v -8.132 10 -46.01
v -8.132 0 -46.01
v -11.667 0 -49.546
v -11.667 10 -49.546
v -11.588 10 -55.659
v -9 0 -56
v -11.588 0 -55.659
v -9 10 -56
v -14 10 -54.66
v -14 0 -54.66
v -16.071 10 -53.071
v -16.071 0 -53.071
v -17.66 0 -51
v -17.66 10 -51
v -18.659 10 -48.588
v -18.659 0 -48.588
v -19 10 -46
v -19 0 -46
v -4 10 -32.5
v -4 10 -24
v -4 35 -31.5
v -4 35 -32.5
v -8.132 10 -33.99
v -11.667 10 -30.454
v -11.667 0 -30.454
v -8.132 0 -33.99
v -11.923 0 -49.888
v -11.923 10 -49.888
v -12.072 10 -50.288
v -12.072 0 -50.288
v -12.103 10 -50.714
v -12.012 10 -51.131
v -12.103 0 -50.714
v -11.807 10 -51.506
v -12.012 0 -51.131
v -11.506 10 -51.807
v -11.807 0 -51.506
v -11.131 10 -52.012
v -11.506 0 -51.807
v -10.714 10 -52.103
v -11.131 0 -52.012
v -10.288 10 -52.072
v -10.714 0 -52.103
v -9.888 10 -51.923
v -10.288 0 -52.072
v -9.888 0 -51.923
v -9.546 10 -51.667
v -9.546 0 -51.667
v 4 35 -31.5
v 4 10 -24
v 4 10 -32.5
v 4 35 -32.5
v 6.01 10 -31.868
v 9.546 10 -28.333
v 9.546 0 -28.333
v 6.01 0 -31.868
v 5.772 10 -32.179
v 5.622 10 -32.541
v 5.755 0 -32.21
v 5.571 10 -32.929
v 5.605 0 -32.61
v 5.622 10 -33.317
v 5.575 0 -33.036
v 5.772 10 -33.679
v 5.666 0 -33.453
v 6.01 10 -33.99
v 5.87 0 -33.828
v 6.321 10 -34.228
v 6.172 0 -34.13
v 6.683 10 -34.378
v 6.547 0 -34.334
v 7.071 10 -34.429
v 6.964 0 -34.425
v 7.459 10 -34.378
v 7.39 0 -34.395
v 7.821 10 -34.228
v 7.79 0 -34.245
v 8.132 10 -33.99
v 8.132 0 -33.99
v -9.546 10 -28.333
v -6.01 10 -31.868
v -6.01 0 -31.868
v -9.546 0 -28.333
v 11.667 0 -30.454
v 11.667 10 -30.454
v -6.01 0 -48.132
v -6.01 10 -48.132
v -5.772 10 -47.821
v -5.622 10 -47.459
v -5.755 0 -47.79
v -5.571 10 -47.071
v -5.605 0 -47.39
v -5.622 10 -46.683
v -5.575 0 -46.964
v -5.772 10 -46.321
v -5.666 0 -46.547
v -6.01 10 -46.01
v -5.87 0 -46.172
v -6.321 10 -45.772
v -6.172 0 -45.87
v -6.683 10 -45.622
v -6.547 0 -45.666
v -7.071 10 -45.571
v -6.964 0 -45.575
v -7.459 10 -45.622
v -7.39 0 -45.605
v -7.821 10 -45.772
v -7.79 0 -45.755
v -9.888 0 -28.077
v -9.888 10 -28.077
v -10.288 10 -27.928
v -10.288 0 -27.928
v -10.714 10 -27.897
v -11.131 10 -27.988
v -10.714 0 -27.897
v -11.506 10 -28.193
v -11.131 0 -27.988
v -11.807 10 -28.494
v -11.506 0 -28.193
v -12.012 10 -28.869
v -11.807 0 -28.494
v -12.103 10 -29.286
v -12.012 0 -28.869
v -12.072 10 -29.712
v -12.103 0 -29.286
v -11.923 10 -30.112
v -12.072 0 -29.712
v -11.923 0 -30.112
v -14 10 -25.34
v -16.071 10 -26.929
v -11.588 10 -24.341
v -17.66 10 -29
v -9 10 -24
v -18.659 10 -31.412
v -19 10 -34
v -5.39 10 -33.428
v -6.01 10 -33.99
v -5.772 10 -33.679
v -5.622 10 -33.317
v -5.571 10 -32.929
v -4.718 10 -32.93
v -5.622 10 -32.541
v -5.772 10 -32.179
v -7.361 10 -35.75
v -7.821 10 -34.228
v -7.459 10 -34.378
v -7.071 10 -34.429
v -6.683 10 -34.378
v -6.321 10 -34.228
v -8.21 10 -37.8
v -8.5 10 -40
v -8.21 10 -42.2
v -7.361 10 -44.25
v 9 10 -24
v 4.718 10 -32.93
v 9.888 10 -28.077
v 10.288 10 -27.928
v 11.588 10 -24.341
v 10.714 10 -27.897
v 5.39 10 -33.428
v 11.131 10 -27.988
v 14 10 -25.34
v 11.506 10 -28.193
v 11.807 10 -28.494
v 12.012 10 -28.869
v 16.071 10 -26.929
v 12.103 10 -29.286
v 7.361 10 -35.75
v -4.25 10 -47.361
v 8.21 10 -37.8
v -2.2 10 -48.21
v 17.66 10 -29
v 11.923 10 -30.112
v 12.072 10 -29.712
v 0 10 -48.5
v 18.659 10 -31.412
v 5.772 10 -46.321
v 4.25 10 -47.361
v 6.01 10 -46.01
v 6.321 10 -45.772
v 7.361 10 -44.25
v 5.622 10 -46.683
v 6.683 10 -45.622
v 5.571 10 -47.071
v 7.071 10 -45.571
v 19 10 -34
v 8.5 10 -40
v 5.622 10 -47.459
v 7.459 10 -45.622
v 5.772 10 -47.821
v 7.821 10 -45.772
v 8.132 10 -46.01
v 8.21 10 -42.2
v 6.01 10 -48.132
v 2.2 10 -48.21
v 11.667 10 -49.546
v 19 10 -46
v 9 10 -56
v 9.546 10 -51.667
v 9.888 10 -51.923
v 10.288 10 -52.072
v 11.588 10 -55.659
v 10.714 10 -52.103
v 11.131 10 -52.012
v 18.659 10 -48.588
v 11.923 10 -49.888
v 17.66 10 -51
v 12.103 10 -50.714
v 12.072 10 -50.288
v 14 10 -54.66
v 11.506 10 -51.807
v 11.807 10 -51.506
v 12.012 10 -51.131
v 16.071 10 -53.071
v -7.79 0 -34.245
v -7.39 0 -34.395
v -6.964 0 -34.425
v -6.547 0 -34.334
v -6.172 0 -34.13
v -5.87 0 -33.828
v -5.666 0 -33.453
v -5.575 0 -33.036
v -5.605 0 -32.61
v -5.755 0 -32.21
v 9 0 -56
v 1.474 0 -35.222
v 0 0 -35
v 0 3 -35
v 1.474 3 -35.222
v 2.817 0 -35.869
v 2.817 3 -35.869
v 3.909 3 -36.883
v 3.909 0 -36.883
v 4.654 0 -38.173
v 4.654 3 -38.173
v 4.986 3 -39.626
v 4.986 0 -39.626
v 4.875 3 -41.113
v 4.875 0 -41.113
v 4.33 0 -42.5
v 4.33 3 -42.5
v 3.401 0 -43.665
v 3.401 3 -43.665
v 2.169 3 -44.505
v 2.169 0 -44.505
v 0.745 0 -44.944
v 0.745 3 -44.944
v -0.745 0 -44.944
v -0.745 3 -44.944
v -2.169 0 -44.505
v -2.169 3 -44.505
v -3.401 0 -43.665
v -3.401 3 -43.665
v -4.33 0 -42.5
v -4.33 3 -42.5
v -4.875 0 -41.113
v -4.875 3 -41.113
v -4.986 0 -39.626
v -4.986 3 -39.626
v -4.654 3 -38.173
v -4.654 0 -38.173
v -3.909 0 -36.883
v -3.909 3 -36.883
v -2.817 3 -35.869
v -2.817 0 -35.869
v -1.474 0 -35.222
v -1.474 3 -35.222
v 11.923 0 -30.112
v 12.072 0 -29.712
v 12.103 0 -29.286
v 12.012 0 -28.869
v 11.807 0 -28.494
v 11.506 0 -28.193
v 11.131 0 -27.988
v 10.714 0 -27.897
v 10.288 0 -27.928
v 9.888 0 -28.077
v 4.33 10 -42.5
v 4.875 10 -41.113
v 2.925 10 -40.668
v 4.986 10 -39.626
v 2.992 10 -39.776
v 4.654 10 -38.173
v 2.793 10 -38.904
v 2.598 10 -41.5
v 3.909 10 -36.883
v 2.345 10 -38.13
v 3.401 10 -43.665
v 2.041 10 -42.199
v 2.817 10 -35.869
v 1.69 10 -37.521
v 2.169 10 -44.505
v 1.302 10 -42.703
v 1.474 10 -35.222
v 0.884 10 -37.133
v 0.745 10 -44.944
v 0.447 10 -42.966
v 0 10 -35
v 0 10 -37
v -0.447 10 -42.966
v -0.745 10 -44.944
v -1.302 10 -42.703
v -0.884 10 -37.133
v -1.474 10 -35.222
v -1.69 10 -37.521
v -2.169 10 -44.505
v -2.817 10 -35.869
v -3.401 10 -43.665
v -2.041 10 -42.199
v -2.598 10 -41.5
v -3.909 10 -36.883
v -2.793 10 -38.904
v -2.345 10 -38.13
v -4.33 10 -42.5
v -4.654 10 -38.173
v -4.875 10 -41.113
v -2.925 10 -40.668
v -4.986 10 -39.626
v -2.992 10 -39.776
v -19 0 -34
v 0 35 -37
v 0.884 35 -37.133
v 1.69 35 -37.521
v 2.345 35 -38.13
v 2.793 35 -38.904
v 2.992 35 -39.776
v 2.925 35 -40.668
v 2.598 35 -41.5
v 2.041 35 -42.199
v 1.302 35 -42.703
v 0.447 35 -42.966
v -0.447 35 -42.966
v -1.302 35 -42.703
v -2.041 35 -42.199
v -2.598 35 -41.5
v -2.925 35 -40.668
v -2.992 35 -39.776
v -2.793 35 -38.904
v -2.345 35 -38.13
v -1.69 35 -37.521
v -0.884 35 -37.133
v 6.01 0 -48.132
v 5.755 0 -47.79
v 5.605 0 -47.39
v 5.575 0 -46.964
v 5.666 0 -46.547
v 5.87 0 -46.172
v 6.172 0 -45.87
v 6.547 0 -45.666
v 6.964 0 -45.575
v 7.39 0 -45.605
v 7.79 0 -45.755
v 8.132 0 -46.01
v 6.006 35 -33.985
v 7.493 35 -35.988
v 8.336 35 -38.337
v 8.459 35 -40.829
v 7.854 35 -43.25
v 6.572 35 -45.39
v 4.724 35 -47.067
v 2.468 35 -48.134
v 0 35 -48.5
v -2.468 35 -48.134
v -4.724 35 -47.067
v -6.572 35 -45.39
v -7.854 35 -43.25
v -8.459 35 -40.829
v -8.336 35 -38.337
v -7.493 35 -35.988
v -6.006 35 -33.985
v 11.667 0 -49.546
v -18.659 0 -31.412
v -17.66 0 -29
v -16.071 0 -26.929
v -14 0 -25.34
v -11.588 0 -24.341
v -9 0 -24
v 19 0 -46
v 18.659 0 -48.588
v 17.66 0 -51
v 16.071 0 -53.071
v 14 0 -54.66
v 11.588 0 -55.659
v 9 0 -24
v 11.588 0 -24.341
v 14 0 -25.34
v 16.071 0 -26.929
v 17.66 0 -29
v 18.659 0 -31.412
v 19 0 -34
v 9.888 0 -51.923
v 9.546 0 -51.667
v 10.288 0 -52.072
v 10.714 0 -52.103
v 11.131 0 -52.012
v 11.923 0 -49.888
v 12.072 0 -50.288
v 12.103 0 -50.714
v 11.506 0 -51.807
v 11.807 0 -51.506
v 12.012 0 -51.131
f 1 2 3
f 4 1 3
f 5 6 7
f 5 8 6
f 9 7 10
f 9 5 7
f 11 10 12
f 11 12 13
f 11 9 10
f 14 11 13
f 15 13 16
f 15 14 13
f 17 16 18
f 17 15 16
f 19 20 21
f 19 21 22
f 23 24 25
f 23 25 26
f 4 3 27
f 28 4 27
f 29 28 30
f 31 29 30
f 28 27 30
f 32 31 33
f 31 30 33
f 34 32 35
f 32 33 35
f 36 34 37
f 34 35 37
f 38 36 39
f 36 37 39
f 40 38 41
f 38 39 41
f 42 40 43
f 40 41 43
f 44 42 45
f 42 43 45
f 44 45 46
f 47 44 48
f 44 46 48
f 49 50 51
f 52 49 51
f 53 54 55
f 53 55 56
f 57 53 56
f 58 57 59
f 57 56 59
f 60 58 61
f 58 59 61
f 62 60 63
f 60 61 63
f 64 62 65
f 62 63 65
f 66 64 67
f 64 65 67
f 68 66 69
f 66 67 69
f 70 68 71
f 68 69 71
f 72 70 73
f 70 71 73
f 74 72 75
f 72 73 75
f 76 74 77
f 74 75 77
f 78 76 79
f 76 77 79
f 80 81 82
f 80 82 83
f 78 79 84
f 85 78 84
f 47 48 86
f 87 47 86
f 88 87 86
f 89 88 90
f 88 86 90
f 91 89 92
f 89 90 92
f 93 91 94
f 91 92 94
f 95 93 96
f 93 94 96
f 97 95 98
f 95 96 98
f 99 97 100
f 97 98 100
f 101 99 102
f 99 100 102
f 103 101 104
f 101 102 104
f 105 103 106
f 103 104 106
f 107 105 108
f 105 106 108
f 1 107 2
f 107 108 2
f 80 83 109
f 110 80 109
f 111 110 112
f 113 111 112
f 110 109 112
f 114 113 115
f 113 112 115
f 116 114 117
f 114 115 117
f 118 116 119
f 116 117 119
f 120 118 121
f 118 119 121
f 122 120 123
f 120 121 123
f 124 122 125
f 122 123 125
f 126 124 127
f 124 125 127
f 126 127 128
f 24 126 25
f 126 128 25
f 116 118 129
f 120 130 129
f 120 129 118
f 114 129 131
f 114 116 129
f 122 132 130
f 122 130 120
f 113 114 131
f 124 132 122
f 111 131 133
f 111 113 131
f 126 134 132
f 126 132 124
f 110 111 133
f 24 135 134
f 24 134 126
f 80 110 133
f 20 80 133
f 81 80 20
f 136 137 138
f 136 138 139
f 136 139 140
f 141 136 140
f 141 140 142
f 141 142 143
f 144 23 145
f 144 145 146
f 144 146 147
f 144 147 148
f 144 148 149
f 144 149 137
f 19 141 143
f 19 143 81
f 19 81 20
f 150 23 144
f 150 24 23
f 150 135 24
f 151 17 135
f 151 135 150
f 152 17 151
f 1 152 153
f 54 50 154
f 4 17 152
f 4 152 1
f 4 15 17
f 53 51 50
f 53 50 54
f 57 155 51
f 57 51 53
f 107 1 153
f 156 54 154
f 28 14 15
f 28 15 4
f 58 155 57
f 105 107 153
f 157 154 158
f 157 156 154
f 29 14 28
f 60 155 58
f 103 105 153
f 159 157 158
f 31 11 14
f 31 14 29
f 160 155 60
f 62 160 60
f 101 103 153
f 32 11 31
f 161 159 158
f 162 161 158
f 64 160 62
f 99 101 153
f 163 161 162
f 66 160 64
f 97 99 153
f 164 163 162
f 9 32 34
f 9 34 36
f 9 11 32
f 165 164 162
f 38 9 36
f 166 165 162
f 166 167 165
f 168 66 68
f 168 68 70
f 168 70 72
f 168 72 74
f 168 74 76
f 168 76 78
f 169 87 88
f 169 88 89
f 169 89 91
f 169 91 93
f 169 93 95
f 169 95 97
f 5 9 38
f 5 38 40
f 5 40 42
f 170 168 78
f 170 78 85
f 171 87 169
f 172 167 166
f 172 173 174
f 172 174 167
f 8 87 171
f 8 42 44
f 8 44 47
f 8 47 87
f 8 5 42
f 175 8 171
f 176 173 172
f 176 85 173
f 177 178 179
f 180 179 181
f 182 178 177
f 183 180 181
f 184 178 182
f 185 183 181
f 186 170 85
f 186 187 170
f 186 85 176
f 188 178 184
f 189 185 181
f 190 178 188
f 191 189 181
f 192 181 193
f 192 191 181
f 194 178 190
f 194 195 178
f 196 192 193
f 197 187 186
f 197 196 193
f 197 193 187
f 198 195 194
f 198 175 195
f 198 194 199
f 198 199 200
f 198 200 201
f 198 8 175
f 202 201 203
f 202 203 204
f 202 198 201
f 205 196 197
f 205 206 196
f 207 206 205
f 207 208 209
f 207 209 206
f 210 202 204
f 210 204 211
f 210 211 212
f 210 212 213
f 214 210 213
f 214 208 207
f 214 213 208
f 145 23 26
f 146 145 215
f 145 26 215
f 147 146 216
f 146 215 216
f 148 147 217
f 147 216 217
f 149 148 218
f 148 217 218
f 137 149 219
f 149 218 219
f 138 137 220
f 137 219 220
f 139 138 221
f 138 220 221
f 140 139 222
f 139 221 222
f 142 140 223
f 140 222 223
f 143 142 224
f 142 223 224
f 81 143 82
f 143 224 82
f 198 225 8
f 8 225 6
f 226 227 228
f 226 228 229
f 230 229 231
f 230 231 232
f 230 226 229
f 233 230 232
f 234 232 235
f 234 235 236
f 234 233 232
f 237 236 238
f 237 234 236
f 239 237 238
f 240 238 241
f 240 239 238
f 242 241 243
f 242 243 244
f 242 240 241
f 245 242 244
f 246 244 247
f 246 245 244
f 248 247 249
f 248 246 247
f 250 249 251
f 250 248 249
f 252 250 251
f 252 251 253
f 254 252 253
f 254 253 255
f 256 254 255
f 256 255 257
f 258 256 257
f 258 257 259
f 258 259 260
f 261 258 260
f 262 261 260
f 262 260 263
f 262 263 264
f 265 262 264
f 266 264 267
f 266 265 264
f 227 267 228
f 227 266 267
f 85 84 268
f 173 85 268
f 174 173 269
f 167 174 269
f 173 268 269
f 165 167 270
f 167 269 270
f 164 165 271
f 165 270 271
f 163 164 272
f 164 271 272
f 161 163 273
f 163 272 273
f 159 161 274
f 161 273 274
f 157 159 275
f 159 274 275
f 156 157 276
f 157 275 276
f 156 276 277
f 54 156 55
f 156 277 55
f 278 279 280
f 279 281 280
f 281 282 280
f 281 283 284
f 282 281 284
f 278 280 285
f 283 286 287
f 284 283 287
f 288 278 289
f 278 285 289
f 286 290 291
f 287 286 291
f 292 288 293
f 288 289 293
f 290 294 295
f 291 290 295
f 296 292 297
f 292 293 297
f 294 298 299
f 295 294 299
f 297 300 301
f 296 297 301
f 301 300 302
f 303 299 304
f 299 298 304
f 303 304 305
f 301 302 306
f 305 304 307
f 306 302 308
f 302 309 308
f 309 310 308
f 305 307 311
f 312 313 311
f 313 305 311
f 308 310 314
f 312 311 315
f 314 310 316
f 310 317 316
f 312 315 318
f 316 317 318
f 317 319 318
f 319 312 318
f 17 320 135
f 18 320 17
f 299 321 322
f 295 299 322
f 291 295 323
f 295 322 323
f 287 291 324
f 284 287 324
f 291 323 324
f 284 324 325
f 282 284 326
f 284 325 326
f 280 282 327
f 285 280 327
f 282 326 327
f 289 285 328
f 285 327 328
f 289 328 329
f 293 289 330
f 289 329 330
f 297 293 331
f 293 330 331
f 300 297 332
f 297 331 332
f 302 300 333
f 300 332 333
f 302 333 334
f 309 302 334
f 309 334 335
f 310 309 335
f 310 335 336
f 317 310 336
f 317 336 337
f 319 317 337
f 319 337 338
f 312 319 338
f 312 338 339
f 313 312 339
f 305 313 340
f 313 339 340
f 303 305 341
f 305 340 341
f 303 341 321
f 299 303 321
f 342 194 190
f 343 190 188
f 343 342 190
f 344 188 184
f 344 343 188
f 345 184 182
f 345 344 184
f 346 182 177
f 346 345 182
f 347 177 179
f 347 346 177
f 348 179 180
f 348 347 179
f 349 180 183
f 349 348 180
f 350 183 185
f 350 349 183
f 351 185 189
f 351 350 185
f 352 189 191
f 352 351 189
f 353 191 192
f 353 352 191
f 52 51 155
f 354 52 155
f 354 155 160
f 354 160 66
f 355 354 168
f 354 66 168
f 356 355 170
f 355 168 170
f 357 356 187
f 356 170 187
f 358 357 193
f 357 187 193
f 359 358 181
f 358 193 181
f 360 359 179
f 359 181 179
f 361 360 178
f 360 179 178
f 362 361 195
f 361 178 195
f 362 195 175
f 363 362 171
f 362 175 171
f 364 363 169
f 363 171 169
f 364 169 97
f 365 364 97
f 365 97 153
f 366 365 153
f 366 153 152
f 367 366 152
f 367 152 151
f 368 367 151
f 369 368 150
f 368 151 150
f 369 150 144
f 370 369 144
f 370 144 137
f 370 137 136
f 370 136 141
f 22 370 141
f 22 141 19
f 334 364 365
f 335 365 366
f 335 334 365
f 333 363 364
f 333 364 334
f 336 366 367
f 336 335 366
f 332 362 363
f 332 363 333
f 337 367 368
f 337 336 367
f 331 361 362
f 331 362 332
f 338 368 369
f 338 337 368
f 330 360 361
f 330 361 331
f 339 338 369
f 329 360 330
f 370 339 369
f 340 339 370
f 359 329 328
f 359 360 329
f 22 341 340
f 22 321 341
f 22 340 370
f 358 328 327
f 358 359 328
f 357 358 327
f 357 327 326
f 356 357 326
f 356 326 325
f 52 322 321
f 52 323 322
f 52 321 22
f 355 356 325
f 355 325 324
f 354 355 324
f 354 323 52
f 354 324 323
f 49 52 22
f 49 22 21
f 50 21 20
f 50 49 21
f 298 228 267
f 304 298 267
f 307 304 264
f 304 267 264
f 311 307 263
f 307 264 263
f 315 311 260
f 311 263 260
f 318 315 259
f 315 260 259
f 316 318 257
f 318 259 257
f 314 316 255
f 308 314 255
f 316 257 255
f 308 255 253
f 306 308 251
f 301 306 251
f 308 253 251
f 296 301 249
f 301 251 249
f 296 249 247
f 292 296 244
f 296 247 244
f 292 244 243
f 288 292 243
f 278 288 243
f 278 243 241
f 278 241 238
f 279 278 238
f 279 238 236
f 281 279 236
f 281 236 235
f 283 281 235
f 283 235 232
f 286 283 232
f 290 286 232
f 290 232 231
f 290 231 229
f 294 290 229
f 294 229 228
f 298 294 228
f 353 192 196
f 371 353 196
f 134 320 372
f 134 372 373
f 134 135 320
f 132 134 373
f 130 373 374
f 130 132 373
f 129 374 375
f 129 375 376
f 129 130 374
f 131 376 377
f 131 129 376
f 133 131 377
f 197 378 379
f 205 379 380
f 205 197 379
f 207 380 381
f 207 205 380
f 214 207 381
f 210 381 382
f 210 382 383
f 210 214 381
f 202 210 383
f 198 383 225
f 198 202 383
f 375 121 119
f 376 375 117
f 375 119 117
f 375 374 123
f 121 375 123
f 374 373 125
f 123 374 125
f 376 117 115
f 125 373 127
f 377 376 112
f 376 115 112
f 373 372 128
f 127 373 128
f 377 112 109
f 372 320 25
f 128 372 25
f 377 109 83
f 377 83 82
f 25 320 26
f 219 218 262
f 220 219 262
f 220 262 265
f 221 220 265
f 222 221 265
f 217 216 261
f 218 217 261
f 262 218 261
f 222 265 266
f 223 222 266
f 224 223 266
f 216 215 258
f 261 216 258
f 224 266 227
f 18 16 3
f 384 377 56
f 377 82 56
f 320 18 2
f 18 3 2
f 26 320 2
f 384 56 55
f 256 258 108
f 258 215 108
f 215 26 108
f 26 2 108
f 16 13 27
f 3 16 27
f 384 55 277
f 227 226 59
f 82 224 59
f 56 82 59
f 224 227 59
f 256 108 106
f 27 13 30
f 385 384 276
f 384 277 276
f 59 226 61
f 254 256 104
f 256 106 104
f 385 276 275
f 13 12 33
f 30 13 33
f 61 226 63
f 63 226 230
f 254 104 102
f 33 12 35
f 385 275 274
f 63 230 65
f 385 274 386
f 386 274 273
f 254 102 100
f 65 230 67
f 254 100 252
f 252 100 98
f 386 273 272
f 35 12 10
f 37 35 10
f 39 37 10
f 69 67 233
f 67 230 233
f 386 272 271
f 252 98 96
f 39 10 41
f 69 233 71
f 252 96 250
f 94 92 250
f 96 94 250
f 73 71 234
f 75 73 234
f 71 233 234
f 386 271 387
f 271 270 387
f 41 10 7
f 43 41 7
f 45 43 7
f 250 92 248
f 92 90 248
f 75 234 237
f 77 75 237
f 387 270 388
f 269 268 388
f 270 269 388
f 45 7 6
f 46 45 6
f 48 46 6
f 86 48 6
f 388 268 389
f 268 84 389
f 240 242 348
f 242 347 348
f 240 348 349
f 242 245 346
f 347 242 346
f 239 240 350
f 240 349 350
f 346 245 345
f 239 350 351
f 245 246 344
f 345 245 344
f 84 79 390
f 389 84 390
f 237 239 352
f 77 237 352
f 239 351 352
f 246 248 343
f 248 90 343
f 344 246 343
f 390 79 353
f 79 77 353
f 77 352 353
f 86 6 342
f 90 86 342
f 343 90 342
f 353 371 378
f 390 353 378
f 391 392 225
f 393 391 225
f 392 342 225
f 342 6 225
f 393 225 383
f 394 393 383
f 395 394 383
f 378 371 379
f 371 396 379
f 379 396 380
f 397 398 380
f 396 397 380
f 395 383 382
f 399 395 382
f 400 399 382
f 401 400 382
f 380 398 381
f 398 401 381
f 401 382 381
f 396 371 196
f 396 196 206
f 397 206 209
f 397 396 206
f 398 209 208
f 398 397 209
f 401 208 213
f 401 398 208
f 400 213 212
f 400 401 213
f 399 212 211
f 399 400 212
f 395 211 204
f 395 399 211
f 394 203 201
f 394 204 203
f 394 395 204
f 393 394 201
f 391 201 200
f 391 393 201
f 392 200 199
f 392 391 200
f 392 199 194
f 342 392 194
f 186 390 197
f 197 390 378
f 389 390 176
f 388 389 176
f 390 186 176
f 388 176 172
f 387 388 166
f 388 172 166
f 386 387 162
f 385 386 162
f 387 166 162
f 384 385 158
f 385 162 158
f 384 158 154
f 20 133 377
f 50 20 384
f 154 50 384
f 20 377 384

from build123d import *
from build123d.topology import SkipClean

# Parameters (mm, degrees)
SKETCH_1_R          = 5
SKETCH_1_R_2        = 1.5
EXTRUDE_2_DEPTH     = 3
CUT_EXTRUDE_START   = -37
SKETCH_2_R          = 1.5
CUT_EXTRUDE_1_DEPTH = 37
SKETCH_3_W          = 38
SKETCH_3_H          = 6.73766493
EXTRUDE_3_DEPTH     = 3
SKETCH_5_W          = 53.60328953
SKETCH_5_H          = 19.816992683
CUT_EXTRUDE_2_DEPTH = 3
SKETCH_6_W          = 38
SKETCH_6_H          = 40
EXTRUDE_5_DEPTH     = 7
SKETCH_8_W          = 38
SKETCH_8_H          = 8
CUT_EXTRUDE_4_DEPTH = 44
SKETCH_9_R          = 5
CUT_EXTRUDE_5_DEPTH = 44
CUT_EXTRUDE_6_DEPTH = 44
SKETCH_13_R         = 8.5
EXTRUDE_6_DEPTH     = 25
SKETCH_14_R         = 3
CUT_EXTRUDE_7_DEPTH = 25
EXTRUDE_7_DEPTH     = 4
FILLET_1_R          = 10


with BuildPart() as part:
    # 草图1 → 凸台-拉伸2 (new body)
    with BuildSketch(Plane(origin=(0, 0, 0), x_dir=(1, 0, 0), z_dir=(0, 1, 0))):
        with BuildLine():
            Line((0, 0), (19, 0))
            Line((19, 0), (19, 64))
            ThreePointArc((19, 64), (0, 66.760766922), (-19, 64))
            Line((-19, 64), (-19, 0))
            Line((-19, 0), (0, 0))
        make_face()
        with Locations((0, 40)):
            Circle(SKETCH_1_R, mode=Mode.SUBTRACT)
        with Locations((-16.171572875, 2.828427125)):
            Circle(SKETCH_1_R_2, mode=Mode.SUBTRACT)
        with Locations((-16.171572875, 61.171572875)):
            Circle(SKETCH_1_R_2, mode=Mode.SUBTRACT)
        with Locations((16.171572875, 61.171572875)):
            Circle(SKETCH_1_R_2, mode=Mode.SUBTRACT)
        with Locations((16.171572875, 2.828427125)):
            Circle(SKETCH_1_R_2, mode=Mode.SUBTRACT)
        with BuildLine():
            Line((10.606601718, 19.929208429), (10.606601718, 16.885025549))
            ThreePointArc((10.606601718, 16.885025549), (0, 16), (-10.606601718, 16.885025549))
            Line((-10.606601718, 16.885025549), (-10.606601718, 19.929208429))
            ThreePointArc((-10.606601718, 19.929208429), (0, 19), (10.606601718, 19.929208429))
        make_face(mode=Mode.SUBTRACT)
        with BuildLine():
            Line((-8.131727984, 46.01040764), (-11.66726189, 49.545941546))
            ThreePointArc((-11.66726189, 49.545941546), (-11.66726189, 51.66726189), (-9.545941546, 51.66726189))
            Line((-9.545941546, 51.66726189), (-6.01040764, 48.131727984))
            ThreePointArc((-6.01040764, 48.131727984), (-6.01040764, 46.01040764), (-8.131727984, 46.01040764))
        make_face(mode=Mode.SUBTRACT)
        with BuildLine():
            Line((6.01040764, 48.131727984), (9.545941546, 51.66726189))
            ThreePointArc((9.545941546, 51.66726189), (11.66726189, 51.66726189), (11.66726189, 49.545941546))
            Line((11.66726189, 49.545941546), (8.131727984, 46.01040764))
            ThreePointArc((8.131727984, 46.01040764), (6.01040764, 46.01040764), (6.01040764, 48.131727984))
        make_face(mode=Mode.SUBTRACT)
        with BuildLine():
            Line((8.131727984, 33.98959236), (11.66726189, 30.454058454))
            ThreePointArc((11.66726189, 30.454058454), (11.66726189, 28.33273811), (9.545941546, 28.33273811))
            Line((9.545941546, 28.33273811), (6.01040764, 31.868272016))
            ThreePointArc((6.01040764, 31.868272016), (6.01040764, 33.98959236), (8.131727984, 33.98959236))
        make_face(mode=Mode.SUBTRACT)
        with BuildLine():
            Line((-6.01040764, 31.868272016), (-9.545941546, 28.33273811))
            ThreePointArc((-9.545941546, 28.33273811), (-11.66726189, 28.33273811), (-11.66726189, 30.454058454))
            Line((-11.66726189, 30.454058454), (-8.131727984, 33.98959236))
            ThreePointArc((-8.131727984, 33.98959236), (-6.01040764, 33.98959236), (-6.01040764, 31.868272016))
        make_face(mode=Mode.SUBTRACT)
        with BuildLine():
            Line((-10.606601718, 60.070791571), (-10.606601718, 63.114974451))
            ThreePointArc((-10.606601718, 63.114974451), (0, 64), (10.606601718, 63.114974451))
            Line((10.606601718, 63.114974451), (10.606601718, 60.070791571))
            ThreePointArc((10.606601718, 60.070791571), (0, 61), (-10.606601718, 60.070791571))
        make_face(mode=Mode.SUBTRACT)
    extrude(amount=EXTRUDE_2_DEPTH)

    # 草图2 → 切除-拉伸1 (cut)
    with BuildSketch(Plane(origin=(0, 3, 0), x_dir=(1, 0, 0), z_dir=(0, 1, 0)).offset(CUT_EXTRUDE_START)):
        Polygon((0, 24), (-19, 24), (-19, 0), (19, 0), (19, 24), align=None)
        with Locations((-16.171572875, 2.828427125)):
            Circle(SKETCH_2_R, mode=Mode.SUBTRACT)
        with Locations((16.171572875, 2.828427125)):
            Circle(SKETCH_2_R, mode=Mode.SUBTRACT)
        with BuildLine():
            Line((-10.606601718, 16.885025549), (-10.606601718, 19.929208429))
            ThreePointArc((-10.606601718, 19.929208429), (0, 19), (10.606601718, 19.929208429))
            Line((10.606601718, 19.929208429), (10.606601718, 16.885025549))
            ThreePointArc((10.606601718, 16.885025549), (0, 16), (-10.606601718, 16.885025549))
        make_face(mode=Mode.SUBTRACT)
    extrude(amount=CUT_EXTRUDE_1_DEPTH, mode=Mode.SUBTRACT)

    # 草图3 → 凸台-拉伸3 (add)
    with BuildSketch(Plane.XZ):
        with Locations((0, -60.631167535)):
            Rectangle(SKETCH_3_W, SKETCH_3_H)
    extrude(amount=-EXTRUDE_3_DEPTH)

    # 草图5 → 切除-拉伸2 (cut)
    with BuildSketch(Plane(origin=(0, 3, 0), x_dir=(1, 0, 0), z_dir=(0, 1, 0))):
        with Locations((7.801644765, 73.908496342)):
            Rectangle(SKETCH_5_W, SKETCH_5_H)
    extrude(amount=-CUT_EXTRUDE_2_DEPTH, mode=Mode.SUBTRACT)

    # 草图6 → 凸台-拉伸5 (add)
    with BuildSketch(Plane(origin=(0, 3, 0), x_dir=(1, 0, 0), z_dir=(0, 1, 0))):
        with Locations((0, 44)):
            Rectangle(SKETCH_6_W, SKETCH_6_H)
    extrude(amount=EXTRUDE_5_DEPTH)

    # 草图8 → 切除-拉伸4 (cut)
    with BuildSketch(Plane(origin=(0, 0, 0), x_dir=(-1, 0, 0), z_dir=(0, -1, 0))):
        with Locations((0, 60)):
            Rectangle(SKETCH_8_W, SKETCH_8_H)
    extrude(amount=-CUT_EXTRUDE_4_DEPTH, mode=Mode.SUBTRACT)

    # 草图9 → 切除-拉伸5 (cut)
    with BuildSketch(Plane.XZ):
        with Locations((0, -40)):
            Circle(SKETCH_9_R)
    extrude(amount=-CUT_EXTRUDE_5_DEPTH, mode=Mode.SUBTRACT)

    # 草图11 → 切除-拉伸6 (cut)
    with BuildSketch(Plane.XZ):
        with BuildLine():
            Line((11.66726189, -30.454058454), (8.131727984, -33.98959236))
            ThreePointArc((8.131727984, -33.98959236), (6.01040764, -33.98959236), (6.01040764, -31.868272016))
            Line((6.01040764, -31.868272016), (9.545941546, -28.33273811))
            ThreePointArc((9.545941546, -28.33273811), (11.66726189, -28.33273811), (11.66726189, -30.454058454))
        make_face()
        with BuildLine():
            Line((9.545941546, -51.66726189), (6.01040764, -48.131727984))
            ThreePointArc((6.01040764, -48.131727984), (6.01040764, -46.01040764), (8.131727984, -46.01040764))
            Line((8.131727984, -46.01040764), (11.66726189, -49.545941546))
            ThreePointArc((11.66726189, -49.545941546), (11.66726189, -51.66726189), (9.545941546, -51.66726189))
        make_face()
        with BuildLine():
            Line((-11.66726189, -49.545941546), (-8.131727984, -46.01040764))
            ThreePointArc((-8.131727984, -46.01040764), (-6.01040764, -46.01040764), (-6.01040764, -48.131727984))
            Line((-6.01040764, -48.131727984), (-9.545941546, -51.66726189))
            ThreePointArc((-9.545941546, -51.66726189), (-11.66726189, -51.66726189), (-11.66726189, -49.545941546))
        make_face()
        with BuildLine():
            Line((-9.545941546, -28.33273811), (-6.01040764, -31.868272016))
            ThreePointArc((-6.01040764, -31.868272016), (-6.01040764, -33.98959236), (-8.131727984, -33.98959236))
            Line((-8.131727984, -33.98959236), (-11.66726189, -30.454058454))
            ThreePointArc((-11.66726189, -30.454058454), (-11.66726189, -28.33273811), (-9.545941546, -28.33273811))
        make_face()
    extrude(amount=-CUT_EXTRUDE_6_DEPTH, mode=Mode.SUBTRACT)

    # 草图13 → 凸台-拉伸6 (add)
    with SkipClean():  # the faces are left unmerged after this step: merging them gives an invalid solid
        with BuildSketch(Plane(origin=(0, 10, 0), x_dir=(1, 0, 0), z_dir=(0, 1, 0))):
            with Locations((0, 40)):
                Circle(SKETCH_13_R)
        extrude(amount=EXTRUDE_6_DEPTH)
    add(part.part.scale(1), mode=Mode.REPLACE)  # the faces are merged on a copy

    # 草图14 → 切除-拉伸7 (cut)
    with BuildSketch(Plane(origin=(0, 35, 0), x_dir=(1, 0, 0), z_dir=(0, 1, 0))):
        with Locations((0, 40)):
            Circle(SKETCH_14_R)
    extrude(amount=-CUT_EXTRUDE_7_DEPTH, mode=Mode.SUBTRACT)

    # 草图15 → 凸台-拉伸7 (add, symmetric)
    with BuildSketch(Plane(origin=(0, 0, 0), x_dir=(0, 0, -1), z_dir=(1, 0, 0))):
        Polygon((31.5, 35), (24, 10), (31.5, 10), (32.928568569, 10), (32.928568569, 35), align=None)
    extrude(amount=EXTRUDE_7_DEPTH, both=True)

    # 圆角1
    fillet_1_edges = [part.edges().sort_by_distance(p)[0] for p in [
        (19, 5, -24),
        (-19, 5, -24),
        (19, 5, -56),
        (-19, 5, -56),
    ]]
    fillet(fillet_1_edges, radius=FILLET_1_R)


solid = part.part
